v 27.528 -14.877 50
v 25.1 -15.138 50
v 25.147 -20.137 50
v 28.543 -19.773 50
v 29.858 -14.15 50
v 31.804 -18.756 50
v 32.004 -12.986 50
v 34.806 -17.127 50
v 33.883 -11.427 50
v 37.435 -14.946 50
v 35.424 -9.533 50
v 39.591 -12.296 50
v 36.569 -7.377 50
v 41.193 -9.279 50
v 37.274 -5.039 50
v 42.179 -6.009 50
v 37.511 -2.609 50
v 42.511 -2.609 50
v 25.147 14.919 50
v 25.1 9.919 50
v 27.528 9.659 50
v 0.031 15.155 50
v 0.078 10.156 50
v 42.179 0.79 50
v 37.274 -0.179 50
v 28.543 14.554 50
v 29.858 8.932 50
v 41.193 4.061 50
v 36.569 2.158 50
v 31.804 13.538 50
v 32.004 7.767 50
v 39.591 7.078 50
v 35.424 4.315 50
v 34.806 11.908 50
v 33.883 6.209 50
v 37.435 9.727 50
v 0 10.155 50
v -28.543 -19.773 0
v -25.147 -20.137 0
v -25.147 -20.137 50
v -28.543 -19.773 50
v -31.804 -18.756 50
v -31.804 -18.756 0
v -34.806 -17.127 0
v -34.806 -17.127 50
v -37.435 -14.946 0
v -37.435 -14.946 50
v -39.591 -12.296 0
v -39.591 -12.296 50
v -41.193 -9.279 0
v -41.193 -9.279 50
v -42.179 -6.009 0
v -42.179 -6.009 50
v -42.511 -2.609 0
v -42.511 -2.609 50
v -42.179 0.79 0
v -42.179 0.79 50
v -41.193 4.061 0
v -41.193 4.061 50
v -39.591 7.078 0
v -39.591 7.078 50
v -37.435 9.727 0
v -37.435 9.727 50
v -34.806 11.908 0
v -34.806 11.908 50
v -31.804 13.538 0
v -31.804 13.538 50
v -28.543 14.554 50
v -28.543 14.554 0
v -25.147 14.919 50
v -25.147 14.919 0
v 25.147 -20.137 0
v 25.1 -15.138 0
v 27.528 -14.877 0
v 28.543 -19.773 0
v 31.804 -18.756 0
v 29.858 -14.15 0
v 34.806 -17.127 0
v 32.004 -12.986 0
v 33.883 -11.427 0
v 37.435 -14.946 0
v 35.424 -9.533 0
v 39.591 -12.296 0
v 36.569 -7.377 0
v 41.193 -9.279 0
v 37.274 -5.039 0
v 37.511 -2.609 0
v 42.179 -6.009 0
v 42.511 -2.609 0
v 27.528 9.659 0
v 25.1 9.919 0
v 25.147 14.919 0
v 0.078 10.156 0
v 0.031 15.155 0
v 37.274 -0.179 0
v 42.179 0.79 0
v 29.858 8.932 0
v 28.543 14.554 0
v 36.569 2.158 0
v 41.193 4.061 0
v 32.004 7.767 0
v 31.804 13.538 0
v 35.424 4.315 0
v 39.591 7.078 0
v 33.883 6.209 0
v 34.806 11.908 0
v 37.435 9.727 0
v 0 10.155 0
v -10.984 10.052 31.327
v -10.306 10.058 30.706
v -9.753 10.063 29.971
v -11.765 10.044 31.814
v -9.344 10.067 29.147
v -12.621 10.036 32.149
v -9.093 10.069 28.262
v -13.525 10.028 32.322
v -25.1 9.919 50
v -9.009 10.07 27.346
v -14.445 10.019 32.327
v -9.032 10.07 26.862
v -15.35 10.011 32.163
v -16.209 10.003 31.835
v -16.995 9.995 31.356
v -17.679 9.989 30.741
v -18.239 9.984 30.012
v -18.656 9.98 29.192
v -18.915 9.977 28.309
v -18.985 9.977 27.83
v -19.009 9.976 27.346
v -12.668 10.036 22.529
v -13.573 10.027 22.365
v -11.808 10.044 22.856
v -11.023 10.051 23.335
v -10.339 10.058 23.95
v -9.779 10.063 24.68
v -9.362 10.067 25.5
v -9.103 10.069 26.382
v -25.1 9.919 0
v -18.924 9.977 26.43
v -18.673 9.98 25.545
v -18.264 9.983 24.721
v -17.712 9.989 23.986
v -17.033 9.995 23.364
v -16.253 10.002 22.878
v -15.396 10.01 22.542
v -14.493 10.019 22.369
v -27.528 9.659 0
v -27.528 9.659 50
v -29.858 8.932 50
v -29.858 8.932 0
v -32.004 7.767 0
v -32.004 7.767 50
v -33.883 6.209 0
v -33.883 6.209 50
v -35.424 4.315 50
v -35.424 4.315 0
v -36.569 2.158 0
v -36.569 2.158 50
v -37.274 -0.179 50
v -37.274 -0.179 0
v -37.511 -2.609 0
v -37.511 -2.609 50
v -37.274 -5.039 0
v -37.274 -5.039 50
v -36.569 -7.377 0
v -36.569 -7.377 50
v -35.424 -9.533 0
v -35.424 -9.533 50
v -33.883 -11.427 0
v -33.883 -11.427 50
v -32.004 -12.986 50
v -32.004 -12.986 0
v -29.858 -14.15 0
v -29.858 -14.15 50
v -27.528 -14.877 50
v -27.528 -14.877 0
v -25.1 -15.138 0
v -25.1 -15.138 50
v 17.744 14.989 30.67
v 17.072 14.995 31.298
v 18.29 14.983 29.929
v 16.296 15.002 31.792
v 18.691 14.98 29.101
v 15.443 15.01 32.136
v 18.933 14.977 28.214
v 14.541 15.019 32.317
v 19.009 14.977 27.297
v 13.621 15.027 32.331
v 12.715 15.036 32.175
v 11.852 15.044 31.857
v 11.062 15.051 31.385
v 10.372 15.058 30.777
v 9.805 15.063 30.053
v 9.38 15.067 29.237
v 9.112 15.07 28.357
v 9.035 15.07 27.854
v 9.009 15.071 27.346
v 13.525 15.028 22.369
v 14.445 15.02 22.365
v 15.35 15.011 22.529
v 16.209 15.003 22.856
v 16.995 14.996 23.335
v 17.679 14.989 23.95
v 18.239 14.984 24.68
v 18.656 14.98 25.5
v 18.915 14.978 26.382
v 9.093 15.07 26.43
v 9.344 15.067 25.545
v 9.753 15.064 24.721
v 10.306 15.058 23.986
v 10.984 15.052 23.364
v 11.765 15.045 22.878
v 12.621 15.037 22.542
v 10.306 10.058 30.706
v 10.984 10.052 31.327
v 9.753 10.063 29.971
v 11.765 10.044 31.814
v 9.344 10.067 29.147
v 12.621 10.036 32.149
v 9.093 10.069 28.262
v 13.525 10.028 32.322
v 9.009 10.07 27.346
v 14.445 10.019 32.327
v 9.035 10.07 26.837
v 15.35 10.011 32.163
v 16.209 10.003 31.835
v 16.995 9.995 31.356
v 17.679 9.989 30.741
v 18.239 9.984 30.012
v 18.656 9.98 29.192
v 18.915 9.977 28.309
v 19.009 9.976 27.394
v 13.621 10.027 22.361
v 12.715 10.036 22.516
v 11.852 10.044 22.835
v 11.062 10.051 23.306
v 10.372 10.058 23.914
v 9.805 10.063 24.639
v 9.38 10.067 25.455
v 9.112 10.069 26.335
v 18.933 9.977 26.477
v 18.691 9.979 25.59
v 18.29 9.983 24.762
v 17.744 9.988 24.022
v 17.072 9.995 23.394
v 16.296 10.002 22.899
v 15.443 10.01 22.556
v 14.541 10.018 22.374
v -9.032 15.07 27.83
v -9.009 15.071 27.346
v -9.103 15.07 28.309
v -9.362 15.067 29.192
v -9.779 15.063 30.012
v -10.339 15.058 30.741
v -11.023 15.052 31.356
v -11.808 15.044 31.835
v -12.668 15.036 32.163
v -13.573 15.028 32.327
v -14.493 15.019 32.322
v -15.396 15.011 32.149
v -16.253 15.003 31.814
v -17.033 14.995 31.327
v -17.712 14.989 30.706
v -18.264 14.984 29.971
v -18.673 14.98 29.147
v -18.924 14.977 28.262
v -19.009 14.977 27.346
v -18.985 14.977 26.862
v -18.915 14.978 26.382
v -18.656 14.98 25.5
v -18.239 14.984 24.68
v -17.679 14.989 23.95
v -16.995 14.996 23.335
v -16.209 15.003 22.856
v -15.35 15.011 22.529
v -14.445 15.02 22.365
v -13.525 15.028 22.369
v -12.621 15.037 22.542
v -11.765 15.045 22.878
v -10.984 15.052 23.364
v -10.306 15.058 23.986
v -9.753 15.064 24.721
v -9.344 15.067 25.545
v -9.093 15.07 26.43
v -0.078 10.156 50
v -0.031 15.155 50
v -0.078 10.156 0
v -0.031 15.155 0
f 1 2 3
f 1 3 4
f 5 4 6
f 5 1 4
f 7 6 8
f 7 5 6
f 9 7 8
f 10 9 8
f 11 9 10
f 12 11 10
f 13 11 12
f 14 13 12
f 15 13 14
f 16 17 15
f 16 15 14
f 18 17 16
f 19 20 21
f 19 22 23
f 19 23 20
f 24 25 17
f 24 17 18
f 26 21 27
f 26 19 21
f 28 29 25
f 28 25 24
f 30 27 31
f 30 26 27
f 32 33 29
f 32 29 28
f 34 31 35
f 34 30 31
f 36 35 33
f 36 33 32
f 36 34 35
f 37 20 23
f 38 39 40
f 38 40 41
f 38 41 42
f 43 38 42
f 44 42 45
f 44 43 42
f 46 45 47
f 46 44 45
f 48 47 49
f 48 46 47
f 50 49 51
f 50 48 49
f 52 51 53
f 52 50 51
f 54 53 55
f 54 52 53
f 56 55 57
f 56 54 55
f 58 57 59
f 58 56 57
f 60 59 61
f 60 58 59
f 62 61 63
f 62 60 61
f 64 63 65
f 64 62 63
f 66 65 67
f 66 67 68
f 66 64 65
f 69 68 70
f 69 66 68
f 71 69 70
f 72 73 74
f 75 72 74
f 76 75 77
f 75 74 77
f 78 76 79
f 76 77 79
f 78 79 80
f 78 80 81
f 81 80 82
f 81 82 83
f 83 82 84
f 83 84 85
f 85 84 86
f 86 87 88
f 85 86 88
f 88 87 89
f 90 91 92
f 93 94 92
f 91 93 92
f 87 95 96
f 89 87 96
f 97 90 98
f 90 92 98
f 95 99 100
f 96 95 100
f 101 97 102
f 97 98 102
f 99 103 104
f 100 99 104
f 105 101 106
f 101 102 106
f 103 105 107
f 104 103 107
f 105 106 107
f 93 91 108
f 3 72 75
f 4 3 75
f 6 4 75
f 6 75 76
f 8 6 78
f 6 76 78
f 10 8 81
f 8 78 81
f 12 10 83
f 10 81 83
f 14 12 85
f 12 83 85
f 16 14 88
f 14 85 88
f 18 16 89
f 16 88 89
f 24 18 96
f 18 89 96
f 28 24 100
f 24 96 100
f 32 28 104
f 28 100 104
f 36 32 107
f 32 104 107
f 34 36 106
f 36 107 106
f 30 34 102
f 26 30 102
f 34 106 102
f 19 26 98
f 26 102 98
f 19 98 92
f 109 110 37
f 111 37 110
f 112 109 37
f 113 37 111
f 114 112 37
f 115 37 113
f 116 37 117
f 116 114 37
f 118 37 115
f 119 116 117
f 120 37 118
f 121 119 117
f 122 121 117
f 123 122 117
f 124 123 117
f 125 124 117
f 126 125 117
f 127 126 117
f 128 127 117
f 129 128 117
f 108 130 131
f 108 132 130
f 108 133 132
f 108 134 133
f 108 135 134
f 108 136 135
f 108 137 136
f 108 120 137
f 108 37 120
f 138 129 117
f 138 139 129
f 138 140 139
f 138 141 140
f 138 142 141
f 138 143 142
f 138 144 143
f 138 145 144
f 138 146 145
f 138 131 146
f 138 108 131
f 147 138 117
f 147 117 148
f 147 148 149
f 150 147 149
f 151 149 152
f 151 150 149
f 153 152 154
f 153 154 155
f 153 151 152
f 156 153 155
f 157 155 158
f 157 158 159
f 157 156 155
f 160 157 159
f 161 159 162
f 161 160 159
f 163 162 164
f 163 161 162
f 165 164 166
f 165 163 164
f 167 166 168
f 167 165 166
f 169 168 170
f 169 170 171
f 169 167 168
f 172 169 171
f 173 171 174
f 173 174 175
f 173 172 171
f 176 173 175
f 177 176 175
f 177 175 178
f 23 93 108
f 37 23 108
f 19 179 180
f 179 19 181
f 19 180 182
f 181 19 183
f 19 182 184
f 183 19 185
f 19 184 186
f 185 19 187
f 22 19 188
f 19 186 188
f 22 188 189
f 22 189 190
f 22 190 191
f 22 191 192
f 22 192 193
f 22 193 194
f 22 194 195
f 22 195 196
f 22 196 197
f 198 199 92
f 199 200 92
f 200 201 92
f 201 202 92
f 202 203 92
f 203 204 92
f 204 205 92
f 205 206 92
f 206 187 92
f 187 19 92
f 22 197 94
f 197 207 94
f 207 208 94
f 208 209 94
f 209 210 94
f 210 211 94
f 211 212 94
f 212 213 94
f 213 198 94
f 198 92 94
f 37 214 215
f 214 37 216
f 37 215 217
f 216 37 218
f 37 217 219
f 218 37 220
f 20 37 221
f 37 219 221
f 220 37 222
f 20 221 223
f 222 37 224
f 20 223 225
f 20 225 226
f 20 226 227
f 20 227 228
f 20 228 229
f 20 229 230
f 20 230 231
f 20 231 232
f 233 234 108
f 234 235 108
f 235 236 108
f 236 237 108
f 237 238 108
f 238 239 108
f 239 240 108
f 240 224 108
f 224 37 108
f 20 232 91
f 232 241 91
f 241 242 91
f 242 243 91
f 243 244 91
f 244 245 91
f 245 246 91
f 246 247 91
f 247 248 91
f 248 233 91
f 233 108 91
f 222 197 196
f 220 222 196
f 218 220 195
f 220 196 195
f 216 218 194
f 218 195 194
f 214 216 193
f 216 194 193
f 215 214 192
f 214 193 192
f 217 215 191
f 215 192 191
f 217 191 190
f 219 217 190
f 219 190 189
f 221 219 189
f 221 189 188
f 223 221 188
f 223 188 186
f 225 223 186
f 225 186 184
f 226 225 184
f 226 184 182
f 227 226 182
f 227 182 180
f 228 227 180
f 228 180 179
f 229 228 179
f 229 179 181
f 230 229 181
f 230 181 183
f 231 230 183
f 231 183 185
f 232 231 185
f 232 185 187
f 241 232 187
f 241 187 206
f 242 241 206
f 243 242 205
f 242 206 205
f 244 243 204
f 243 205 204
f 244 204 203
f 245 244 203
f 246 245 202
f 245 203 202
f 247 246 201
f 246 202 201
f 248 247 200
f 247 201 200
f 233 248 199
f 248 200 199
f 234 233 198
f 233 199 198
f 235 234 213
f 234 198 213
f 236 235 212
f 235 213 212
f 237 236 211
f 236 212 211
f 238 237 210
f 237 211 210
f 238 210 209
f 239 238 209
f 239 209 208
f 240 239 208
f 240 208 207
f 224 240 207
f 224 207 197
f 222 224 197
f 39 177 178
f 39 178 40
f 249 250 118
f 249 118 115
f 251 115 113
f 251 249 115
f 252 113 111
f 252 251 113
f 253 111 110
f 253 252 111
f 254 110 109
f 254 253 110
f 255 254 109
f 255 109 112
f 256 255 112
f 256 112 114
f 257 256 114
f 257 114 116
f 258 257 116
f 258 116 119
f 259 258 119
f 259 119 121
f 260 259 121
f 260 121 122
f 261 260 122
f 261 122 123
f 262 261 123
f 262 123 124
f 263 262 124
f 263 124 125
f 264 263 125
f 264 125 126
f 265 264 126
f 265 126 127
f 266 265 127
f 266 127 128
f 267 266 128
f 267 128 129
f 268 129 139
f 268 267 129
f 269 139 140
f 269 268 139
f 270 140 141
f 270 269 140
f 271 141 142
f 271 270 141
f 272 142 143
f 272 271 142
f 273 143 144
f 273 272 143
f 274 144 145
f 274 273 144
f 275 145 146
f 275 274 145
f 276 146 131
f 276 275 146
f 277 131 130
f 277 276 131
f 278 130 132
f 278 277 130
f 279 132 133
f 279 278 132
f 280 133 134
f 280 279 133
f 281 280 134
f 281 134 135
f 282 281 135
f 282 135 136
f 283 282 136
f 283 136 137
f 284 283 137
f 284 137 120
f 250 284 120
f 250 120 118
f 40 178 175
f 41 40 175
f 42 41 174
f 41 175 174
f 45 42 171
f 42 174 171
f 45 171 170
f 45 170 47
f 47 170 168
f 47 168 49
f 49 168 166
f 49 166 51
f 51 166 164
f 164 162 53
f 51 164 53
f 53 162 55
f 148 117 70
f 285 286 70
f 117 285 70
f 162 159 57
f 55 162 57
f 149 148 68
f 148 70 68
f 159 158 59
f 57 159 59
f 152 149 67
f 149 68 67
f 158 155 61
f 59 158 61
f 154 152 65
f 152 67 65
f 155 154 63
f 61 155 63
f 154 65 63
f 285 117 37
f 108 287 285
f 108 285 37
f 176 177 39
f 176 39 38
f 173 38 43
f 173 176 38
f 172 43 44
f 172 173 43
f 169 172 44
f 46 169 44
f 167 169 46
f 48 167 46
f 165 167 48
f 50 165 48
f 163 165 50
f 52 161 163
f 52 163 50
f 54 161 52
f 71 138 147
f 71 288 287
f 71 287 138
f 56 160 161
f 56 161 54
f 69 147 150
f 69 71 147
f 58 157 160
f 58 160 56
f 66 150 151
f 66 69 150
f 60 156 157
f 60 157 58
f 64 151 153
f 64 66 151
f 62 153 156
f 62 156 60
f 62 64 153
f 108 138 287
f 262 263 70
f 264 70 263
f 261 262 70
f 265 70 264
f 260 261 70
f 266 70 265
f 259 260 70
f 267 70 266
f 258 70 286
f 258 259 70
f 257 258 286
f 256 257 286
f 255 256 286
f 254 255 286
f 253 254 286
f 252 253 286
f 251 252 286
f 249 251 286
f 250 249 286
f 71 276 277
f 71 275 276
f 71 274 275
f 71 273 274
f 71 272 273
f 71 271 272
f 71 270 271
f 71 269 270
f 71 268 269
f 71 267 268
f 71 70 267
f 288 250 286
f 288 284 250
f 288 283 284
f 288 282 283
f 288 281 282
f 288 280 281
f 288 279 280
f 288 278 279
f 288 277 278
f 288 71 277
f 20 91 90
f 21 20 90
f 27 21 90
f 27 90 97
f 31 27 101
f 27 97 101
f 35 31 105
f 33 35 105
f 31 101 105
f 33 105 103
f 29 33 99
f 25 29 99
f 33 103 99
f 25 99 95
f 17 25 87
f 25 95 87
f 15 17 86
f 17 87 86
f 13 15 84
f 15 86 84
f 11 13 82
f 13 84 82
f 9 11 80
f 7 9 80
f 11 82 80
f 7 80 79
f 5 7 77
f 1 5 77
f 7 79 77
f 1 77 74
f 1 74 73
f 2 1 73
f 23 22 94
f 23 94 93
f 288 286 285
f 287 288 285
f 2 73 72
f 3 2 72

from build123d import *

# Parameters (mm, degrees)
F1_DEPTH = 50
F4_D     = 10
F4_2_D   = 10


with BuildPart() as f1:
    # F0 (on Top) → F1 (new body)
    with BuildSketch(Plane.XY):
        with BuildLine():
            ThreePointArc((25.099999, 9.919318), (37.511414, -2.609092), (25.099999, -15.137502))
            Line((25.099999, -15.137502), (25.146909, -20.137282))
            ThreePointArc((25.146909, -20.137282), (42.511414, -2.609092), (25.146909, 14.919098))
            Line((25.146909, 14.919098), (0.031496, 15.154741))
            Line((0.031496, 15.154741), (0.0784, 10.155552))
            Line((0.0784, 10.155552), (0, 10.154816))
            Line((0, 10.154816), (25.099999, 9.919318))
        make_face()
    extrude(amount=F1_DEPTH)

    # F4 (through all)
    with Locations(Plane.XZ):
        with Locations((-14.008855, 27.345683), (14.008855, 27.345683)):
            Hole(F4_D / 2)


with BuildPart() as f2_1:
    # F2: instance of F1
    add(f1.part.mirror(Plane.YZ))

    # F4#2 (through all)
    with Locations(Plane.XZ):
        with Locations((-14.008855, 27.345683), (14.008855, 27.345683)):
            Hole(F4_2_D / 2)


solid = Compound([f1.part, f2_1.part])
